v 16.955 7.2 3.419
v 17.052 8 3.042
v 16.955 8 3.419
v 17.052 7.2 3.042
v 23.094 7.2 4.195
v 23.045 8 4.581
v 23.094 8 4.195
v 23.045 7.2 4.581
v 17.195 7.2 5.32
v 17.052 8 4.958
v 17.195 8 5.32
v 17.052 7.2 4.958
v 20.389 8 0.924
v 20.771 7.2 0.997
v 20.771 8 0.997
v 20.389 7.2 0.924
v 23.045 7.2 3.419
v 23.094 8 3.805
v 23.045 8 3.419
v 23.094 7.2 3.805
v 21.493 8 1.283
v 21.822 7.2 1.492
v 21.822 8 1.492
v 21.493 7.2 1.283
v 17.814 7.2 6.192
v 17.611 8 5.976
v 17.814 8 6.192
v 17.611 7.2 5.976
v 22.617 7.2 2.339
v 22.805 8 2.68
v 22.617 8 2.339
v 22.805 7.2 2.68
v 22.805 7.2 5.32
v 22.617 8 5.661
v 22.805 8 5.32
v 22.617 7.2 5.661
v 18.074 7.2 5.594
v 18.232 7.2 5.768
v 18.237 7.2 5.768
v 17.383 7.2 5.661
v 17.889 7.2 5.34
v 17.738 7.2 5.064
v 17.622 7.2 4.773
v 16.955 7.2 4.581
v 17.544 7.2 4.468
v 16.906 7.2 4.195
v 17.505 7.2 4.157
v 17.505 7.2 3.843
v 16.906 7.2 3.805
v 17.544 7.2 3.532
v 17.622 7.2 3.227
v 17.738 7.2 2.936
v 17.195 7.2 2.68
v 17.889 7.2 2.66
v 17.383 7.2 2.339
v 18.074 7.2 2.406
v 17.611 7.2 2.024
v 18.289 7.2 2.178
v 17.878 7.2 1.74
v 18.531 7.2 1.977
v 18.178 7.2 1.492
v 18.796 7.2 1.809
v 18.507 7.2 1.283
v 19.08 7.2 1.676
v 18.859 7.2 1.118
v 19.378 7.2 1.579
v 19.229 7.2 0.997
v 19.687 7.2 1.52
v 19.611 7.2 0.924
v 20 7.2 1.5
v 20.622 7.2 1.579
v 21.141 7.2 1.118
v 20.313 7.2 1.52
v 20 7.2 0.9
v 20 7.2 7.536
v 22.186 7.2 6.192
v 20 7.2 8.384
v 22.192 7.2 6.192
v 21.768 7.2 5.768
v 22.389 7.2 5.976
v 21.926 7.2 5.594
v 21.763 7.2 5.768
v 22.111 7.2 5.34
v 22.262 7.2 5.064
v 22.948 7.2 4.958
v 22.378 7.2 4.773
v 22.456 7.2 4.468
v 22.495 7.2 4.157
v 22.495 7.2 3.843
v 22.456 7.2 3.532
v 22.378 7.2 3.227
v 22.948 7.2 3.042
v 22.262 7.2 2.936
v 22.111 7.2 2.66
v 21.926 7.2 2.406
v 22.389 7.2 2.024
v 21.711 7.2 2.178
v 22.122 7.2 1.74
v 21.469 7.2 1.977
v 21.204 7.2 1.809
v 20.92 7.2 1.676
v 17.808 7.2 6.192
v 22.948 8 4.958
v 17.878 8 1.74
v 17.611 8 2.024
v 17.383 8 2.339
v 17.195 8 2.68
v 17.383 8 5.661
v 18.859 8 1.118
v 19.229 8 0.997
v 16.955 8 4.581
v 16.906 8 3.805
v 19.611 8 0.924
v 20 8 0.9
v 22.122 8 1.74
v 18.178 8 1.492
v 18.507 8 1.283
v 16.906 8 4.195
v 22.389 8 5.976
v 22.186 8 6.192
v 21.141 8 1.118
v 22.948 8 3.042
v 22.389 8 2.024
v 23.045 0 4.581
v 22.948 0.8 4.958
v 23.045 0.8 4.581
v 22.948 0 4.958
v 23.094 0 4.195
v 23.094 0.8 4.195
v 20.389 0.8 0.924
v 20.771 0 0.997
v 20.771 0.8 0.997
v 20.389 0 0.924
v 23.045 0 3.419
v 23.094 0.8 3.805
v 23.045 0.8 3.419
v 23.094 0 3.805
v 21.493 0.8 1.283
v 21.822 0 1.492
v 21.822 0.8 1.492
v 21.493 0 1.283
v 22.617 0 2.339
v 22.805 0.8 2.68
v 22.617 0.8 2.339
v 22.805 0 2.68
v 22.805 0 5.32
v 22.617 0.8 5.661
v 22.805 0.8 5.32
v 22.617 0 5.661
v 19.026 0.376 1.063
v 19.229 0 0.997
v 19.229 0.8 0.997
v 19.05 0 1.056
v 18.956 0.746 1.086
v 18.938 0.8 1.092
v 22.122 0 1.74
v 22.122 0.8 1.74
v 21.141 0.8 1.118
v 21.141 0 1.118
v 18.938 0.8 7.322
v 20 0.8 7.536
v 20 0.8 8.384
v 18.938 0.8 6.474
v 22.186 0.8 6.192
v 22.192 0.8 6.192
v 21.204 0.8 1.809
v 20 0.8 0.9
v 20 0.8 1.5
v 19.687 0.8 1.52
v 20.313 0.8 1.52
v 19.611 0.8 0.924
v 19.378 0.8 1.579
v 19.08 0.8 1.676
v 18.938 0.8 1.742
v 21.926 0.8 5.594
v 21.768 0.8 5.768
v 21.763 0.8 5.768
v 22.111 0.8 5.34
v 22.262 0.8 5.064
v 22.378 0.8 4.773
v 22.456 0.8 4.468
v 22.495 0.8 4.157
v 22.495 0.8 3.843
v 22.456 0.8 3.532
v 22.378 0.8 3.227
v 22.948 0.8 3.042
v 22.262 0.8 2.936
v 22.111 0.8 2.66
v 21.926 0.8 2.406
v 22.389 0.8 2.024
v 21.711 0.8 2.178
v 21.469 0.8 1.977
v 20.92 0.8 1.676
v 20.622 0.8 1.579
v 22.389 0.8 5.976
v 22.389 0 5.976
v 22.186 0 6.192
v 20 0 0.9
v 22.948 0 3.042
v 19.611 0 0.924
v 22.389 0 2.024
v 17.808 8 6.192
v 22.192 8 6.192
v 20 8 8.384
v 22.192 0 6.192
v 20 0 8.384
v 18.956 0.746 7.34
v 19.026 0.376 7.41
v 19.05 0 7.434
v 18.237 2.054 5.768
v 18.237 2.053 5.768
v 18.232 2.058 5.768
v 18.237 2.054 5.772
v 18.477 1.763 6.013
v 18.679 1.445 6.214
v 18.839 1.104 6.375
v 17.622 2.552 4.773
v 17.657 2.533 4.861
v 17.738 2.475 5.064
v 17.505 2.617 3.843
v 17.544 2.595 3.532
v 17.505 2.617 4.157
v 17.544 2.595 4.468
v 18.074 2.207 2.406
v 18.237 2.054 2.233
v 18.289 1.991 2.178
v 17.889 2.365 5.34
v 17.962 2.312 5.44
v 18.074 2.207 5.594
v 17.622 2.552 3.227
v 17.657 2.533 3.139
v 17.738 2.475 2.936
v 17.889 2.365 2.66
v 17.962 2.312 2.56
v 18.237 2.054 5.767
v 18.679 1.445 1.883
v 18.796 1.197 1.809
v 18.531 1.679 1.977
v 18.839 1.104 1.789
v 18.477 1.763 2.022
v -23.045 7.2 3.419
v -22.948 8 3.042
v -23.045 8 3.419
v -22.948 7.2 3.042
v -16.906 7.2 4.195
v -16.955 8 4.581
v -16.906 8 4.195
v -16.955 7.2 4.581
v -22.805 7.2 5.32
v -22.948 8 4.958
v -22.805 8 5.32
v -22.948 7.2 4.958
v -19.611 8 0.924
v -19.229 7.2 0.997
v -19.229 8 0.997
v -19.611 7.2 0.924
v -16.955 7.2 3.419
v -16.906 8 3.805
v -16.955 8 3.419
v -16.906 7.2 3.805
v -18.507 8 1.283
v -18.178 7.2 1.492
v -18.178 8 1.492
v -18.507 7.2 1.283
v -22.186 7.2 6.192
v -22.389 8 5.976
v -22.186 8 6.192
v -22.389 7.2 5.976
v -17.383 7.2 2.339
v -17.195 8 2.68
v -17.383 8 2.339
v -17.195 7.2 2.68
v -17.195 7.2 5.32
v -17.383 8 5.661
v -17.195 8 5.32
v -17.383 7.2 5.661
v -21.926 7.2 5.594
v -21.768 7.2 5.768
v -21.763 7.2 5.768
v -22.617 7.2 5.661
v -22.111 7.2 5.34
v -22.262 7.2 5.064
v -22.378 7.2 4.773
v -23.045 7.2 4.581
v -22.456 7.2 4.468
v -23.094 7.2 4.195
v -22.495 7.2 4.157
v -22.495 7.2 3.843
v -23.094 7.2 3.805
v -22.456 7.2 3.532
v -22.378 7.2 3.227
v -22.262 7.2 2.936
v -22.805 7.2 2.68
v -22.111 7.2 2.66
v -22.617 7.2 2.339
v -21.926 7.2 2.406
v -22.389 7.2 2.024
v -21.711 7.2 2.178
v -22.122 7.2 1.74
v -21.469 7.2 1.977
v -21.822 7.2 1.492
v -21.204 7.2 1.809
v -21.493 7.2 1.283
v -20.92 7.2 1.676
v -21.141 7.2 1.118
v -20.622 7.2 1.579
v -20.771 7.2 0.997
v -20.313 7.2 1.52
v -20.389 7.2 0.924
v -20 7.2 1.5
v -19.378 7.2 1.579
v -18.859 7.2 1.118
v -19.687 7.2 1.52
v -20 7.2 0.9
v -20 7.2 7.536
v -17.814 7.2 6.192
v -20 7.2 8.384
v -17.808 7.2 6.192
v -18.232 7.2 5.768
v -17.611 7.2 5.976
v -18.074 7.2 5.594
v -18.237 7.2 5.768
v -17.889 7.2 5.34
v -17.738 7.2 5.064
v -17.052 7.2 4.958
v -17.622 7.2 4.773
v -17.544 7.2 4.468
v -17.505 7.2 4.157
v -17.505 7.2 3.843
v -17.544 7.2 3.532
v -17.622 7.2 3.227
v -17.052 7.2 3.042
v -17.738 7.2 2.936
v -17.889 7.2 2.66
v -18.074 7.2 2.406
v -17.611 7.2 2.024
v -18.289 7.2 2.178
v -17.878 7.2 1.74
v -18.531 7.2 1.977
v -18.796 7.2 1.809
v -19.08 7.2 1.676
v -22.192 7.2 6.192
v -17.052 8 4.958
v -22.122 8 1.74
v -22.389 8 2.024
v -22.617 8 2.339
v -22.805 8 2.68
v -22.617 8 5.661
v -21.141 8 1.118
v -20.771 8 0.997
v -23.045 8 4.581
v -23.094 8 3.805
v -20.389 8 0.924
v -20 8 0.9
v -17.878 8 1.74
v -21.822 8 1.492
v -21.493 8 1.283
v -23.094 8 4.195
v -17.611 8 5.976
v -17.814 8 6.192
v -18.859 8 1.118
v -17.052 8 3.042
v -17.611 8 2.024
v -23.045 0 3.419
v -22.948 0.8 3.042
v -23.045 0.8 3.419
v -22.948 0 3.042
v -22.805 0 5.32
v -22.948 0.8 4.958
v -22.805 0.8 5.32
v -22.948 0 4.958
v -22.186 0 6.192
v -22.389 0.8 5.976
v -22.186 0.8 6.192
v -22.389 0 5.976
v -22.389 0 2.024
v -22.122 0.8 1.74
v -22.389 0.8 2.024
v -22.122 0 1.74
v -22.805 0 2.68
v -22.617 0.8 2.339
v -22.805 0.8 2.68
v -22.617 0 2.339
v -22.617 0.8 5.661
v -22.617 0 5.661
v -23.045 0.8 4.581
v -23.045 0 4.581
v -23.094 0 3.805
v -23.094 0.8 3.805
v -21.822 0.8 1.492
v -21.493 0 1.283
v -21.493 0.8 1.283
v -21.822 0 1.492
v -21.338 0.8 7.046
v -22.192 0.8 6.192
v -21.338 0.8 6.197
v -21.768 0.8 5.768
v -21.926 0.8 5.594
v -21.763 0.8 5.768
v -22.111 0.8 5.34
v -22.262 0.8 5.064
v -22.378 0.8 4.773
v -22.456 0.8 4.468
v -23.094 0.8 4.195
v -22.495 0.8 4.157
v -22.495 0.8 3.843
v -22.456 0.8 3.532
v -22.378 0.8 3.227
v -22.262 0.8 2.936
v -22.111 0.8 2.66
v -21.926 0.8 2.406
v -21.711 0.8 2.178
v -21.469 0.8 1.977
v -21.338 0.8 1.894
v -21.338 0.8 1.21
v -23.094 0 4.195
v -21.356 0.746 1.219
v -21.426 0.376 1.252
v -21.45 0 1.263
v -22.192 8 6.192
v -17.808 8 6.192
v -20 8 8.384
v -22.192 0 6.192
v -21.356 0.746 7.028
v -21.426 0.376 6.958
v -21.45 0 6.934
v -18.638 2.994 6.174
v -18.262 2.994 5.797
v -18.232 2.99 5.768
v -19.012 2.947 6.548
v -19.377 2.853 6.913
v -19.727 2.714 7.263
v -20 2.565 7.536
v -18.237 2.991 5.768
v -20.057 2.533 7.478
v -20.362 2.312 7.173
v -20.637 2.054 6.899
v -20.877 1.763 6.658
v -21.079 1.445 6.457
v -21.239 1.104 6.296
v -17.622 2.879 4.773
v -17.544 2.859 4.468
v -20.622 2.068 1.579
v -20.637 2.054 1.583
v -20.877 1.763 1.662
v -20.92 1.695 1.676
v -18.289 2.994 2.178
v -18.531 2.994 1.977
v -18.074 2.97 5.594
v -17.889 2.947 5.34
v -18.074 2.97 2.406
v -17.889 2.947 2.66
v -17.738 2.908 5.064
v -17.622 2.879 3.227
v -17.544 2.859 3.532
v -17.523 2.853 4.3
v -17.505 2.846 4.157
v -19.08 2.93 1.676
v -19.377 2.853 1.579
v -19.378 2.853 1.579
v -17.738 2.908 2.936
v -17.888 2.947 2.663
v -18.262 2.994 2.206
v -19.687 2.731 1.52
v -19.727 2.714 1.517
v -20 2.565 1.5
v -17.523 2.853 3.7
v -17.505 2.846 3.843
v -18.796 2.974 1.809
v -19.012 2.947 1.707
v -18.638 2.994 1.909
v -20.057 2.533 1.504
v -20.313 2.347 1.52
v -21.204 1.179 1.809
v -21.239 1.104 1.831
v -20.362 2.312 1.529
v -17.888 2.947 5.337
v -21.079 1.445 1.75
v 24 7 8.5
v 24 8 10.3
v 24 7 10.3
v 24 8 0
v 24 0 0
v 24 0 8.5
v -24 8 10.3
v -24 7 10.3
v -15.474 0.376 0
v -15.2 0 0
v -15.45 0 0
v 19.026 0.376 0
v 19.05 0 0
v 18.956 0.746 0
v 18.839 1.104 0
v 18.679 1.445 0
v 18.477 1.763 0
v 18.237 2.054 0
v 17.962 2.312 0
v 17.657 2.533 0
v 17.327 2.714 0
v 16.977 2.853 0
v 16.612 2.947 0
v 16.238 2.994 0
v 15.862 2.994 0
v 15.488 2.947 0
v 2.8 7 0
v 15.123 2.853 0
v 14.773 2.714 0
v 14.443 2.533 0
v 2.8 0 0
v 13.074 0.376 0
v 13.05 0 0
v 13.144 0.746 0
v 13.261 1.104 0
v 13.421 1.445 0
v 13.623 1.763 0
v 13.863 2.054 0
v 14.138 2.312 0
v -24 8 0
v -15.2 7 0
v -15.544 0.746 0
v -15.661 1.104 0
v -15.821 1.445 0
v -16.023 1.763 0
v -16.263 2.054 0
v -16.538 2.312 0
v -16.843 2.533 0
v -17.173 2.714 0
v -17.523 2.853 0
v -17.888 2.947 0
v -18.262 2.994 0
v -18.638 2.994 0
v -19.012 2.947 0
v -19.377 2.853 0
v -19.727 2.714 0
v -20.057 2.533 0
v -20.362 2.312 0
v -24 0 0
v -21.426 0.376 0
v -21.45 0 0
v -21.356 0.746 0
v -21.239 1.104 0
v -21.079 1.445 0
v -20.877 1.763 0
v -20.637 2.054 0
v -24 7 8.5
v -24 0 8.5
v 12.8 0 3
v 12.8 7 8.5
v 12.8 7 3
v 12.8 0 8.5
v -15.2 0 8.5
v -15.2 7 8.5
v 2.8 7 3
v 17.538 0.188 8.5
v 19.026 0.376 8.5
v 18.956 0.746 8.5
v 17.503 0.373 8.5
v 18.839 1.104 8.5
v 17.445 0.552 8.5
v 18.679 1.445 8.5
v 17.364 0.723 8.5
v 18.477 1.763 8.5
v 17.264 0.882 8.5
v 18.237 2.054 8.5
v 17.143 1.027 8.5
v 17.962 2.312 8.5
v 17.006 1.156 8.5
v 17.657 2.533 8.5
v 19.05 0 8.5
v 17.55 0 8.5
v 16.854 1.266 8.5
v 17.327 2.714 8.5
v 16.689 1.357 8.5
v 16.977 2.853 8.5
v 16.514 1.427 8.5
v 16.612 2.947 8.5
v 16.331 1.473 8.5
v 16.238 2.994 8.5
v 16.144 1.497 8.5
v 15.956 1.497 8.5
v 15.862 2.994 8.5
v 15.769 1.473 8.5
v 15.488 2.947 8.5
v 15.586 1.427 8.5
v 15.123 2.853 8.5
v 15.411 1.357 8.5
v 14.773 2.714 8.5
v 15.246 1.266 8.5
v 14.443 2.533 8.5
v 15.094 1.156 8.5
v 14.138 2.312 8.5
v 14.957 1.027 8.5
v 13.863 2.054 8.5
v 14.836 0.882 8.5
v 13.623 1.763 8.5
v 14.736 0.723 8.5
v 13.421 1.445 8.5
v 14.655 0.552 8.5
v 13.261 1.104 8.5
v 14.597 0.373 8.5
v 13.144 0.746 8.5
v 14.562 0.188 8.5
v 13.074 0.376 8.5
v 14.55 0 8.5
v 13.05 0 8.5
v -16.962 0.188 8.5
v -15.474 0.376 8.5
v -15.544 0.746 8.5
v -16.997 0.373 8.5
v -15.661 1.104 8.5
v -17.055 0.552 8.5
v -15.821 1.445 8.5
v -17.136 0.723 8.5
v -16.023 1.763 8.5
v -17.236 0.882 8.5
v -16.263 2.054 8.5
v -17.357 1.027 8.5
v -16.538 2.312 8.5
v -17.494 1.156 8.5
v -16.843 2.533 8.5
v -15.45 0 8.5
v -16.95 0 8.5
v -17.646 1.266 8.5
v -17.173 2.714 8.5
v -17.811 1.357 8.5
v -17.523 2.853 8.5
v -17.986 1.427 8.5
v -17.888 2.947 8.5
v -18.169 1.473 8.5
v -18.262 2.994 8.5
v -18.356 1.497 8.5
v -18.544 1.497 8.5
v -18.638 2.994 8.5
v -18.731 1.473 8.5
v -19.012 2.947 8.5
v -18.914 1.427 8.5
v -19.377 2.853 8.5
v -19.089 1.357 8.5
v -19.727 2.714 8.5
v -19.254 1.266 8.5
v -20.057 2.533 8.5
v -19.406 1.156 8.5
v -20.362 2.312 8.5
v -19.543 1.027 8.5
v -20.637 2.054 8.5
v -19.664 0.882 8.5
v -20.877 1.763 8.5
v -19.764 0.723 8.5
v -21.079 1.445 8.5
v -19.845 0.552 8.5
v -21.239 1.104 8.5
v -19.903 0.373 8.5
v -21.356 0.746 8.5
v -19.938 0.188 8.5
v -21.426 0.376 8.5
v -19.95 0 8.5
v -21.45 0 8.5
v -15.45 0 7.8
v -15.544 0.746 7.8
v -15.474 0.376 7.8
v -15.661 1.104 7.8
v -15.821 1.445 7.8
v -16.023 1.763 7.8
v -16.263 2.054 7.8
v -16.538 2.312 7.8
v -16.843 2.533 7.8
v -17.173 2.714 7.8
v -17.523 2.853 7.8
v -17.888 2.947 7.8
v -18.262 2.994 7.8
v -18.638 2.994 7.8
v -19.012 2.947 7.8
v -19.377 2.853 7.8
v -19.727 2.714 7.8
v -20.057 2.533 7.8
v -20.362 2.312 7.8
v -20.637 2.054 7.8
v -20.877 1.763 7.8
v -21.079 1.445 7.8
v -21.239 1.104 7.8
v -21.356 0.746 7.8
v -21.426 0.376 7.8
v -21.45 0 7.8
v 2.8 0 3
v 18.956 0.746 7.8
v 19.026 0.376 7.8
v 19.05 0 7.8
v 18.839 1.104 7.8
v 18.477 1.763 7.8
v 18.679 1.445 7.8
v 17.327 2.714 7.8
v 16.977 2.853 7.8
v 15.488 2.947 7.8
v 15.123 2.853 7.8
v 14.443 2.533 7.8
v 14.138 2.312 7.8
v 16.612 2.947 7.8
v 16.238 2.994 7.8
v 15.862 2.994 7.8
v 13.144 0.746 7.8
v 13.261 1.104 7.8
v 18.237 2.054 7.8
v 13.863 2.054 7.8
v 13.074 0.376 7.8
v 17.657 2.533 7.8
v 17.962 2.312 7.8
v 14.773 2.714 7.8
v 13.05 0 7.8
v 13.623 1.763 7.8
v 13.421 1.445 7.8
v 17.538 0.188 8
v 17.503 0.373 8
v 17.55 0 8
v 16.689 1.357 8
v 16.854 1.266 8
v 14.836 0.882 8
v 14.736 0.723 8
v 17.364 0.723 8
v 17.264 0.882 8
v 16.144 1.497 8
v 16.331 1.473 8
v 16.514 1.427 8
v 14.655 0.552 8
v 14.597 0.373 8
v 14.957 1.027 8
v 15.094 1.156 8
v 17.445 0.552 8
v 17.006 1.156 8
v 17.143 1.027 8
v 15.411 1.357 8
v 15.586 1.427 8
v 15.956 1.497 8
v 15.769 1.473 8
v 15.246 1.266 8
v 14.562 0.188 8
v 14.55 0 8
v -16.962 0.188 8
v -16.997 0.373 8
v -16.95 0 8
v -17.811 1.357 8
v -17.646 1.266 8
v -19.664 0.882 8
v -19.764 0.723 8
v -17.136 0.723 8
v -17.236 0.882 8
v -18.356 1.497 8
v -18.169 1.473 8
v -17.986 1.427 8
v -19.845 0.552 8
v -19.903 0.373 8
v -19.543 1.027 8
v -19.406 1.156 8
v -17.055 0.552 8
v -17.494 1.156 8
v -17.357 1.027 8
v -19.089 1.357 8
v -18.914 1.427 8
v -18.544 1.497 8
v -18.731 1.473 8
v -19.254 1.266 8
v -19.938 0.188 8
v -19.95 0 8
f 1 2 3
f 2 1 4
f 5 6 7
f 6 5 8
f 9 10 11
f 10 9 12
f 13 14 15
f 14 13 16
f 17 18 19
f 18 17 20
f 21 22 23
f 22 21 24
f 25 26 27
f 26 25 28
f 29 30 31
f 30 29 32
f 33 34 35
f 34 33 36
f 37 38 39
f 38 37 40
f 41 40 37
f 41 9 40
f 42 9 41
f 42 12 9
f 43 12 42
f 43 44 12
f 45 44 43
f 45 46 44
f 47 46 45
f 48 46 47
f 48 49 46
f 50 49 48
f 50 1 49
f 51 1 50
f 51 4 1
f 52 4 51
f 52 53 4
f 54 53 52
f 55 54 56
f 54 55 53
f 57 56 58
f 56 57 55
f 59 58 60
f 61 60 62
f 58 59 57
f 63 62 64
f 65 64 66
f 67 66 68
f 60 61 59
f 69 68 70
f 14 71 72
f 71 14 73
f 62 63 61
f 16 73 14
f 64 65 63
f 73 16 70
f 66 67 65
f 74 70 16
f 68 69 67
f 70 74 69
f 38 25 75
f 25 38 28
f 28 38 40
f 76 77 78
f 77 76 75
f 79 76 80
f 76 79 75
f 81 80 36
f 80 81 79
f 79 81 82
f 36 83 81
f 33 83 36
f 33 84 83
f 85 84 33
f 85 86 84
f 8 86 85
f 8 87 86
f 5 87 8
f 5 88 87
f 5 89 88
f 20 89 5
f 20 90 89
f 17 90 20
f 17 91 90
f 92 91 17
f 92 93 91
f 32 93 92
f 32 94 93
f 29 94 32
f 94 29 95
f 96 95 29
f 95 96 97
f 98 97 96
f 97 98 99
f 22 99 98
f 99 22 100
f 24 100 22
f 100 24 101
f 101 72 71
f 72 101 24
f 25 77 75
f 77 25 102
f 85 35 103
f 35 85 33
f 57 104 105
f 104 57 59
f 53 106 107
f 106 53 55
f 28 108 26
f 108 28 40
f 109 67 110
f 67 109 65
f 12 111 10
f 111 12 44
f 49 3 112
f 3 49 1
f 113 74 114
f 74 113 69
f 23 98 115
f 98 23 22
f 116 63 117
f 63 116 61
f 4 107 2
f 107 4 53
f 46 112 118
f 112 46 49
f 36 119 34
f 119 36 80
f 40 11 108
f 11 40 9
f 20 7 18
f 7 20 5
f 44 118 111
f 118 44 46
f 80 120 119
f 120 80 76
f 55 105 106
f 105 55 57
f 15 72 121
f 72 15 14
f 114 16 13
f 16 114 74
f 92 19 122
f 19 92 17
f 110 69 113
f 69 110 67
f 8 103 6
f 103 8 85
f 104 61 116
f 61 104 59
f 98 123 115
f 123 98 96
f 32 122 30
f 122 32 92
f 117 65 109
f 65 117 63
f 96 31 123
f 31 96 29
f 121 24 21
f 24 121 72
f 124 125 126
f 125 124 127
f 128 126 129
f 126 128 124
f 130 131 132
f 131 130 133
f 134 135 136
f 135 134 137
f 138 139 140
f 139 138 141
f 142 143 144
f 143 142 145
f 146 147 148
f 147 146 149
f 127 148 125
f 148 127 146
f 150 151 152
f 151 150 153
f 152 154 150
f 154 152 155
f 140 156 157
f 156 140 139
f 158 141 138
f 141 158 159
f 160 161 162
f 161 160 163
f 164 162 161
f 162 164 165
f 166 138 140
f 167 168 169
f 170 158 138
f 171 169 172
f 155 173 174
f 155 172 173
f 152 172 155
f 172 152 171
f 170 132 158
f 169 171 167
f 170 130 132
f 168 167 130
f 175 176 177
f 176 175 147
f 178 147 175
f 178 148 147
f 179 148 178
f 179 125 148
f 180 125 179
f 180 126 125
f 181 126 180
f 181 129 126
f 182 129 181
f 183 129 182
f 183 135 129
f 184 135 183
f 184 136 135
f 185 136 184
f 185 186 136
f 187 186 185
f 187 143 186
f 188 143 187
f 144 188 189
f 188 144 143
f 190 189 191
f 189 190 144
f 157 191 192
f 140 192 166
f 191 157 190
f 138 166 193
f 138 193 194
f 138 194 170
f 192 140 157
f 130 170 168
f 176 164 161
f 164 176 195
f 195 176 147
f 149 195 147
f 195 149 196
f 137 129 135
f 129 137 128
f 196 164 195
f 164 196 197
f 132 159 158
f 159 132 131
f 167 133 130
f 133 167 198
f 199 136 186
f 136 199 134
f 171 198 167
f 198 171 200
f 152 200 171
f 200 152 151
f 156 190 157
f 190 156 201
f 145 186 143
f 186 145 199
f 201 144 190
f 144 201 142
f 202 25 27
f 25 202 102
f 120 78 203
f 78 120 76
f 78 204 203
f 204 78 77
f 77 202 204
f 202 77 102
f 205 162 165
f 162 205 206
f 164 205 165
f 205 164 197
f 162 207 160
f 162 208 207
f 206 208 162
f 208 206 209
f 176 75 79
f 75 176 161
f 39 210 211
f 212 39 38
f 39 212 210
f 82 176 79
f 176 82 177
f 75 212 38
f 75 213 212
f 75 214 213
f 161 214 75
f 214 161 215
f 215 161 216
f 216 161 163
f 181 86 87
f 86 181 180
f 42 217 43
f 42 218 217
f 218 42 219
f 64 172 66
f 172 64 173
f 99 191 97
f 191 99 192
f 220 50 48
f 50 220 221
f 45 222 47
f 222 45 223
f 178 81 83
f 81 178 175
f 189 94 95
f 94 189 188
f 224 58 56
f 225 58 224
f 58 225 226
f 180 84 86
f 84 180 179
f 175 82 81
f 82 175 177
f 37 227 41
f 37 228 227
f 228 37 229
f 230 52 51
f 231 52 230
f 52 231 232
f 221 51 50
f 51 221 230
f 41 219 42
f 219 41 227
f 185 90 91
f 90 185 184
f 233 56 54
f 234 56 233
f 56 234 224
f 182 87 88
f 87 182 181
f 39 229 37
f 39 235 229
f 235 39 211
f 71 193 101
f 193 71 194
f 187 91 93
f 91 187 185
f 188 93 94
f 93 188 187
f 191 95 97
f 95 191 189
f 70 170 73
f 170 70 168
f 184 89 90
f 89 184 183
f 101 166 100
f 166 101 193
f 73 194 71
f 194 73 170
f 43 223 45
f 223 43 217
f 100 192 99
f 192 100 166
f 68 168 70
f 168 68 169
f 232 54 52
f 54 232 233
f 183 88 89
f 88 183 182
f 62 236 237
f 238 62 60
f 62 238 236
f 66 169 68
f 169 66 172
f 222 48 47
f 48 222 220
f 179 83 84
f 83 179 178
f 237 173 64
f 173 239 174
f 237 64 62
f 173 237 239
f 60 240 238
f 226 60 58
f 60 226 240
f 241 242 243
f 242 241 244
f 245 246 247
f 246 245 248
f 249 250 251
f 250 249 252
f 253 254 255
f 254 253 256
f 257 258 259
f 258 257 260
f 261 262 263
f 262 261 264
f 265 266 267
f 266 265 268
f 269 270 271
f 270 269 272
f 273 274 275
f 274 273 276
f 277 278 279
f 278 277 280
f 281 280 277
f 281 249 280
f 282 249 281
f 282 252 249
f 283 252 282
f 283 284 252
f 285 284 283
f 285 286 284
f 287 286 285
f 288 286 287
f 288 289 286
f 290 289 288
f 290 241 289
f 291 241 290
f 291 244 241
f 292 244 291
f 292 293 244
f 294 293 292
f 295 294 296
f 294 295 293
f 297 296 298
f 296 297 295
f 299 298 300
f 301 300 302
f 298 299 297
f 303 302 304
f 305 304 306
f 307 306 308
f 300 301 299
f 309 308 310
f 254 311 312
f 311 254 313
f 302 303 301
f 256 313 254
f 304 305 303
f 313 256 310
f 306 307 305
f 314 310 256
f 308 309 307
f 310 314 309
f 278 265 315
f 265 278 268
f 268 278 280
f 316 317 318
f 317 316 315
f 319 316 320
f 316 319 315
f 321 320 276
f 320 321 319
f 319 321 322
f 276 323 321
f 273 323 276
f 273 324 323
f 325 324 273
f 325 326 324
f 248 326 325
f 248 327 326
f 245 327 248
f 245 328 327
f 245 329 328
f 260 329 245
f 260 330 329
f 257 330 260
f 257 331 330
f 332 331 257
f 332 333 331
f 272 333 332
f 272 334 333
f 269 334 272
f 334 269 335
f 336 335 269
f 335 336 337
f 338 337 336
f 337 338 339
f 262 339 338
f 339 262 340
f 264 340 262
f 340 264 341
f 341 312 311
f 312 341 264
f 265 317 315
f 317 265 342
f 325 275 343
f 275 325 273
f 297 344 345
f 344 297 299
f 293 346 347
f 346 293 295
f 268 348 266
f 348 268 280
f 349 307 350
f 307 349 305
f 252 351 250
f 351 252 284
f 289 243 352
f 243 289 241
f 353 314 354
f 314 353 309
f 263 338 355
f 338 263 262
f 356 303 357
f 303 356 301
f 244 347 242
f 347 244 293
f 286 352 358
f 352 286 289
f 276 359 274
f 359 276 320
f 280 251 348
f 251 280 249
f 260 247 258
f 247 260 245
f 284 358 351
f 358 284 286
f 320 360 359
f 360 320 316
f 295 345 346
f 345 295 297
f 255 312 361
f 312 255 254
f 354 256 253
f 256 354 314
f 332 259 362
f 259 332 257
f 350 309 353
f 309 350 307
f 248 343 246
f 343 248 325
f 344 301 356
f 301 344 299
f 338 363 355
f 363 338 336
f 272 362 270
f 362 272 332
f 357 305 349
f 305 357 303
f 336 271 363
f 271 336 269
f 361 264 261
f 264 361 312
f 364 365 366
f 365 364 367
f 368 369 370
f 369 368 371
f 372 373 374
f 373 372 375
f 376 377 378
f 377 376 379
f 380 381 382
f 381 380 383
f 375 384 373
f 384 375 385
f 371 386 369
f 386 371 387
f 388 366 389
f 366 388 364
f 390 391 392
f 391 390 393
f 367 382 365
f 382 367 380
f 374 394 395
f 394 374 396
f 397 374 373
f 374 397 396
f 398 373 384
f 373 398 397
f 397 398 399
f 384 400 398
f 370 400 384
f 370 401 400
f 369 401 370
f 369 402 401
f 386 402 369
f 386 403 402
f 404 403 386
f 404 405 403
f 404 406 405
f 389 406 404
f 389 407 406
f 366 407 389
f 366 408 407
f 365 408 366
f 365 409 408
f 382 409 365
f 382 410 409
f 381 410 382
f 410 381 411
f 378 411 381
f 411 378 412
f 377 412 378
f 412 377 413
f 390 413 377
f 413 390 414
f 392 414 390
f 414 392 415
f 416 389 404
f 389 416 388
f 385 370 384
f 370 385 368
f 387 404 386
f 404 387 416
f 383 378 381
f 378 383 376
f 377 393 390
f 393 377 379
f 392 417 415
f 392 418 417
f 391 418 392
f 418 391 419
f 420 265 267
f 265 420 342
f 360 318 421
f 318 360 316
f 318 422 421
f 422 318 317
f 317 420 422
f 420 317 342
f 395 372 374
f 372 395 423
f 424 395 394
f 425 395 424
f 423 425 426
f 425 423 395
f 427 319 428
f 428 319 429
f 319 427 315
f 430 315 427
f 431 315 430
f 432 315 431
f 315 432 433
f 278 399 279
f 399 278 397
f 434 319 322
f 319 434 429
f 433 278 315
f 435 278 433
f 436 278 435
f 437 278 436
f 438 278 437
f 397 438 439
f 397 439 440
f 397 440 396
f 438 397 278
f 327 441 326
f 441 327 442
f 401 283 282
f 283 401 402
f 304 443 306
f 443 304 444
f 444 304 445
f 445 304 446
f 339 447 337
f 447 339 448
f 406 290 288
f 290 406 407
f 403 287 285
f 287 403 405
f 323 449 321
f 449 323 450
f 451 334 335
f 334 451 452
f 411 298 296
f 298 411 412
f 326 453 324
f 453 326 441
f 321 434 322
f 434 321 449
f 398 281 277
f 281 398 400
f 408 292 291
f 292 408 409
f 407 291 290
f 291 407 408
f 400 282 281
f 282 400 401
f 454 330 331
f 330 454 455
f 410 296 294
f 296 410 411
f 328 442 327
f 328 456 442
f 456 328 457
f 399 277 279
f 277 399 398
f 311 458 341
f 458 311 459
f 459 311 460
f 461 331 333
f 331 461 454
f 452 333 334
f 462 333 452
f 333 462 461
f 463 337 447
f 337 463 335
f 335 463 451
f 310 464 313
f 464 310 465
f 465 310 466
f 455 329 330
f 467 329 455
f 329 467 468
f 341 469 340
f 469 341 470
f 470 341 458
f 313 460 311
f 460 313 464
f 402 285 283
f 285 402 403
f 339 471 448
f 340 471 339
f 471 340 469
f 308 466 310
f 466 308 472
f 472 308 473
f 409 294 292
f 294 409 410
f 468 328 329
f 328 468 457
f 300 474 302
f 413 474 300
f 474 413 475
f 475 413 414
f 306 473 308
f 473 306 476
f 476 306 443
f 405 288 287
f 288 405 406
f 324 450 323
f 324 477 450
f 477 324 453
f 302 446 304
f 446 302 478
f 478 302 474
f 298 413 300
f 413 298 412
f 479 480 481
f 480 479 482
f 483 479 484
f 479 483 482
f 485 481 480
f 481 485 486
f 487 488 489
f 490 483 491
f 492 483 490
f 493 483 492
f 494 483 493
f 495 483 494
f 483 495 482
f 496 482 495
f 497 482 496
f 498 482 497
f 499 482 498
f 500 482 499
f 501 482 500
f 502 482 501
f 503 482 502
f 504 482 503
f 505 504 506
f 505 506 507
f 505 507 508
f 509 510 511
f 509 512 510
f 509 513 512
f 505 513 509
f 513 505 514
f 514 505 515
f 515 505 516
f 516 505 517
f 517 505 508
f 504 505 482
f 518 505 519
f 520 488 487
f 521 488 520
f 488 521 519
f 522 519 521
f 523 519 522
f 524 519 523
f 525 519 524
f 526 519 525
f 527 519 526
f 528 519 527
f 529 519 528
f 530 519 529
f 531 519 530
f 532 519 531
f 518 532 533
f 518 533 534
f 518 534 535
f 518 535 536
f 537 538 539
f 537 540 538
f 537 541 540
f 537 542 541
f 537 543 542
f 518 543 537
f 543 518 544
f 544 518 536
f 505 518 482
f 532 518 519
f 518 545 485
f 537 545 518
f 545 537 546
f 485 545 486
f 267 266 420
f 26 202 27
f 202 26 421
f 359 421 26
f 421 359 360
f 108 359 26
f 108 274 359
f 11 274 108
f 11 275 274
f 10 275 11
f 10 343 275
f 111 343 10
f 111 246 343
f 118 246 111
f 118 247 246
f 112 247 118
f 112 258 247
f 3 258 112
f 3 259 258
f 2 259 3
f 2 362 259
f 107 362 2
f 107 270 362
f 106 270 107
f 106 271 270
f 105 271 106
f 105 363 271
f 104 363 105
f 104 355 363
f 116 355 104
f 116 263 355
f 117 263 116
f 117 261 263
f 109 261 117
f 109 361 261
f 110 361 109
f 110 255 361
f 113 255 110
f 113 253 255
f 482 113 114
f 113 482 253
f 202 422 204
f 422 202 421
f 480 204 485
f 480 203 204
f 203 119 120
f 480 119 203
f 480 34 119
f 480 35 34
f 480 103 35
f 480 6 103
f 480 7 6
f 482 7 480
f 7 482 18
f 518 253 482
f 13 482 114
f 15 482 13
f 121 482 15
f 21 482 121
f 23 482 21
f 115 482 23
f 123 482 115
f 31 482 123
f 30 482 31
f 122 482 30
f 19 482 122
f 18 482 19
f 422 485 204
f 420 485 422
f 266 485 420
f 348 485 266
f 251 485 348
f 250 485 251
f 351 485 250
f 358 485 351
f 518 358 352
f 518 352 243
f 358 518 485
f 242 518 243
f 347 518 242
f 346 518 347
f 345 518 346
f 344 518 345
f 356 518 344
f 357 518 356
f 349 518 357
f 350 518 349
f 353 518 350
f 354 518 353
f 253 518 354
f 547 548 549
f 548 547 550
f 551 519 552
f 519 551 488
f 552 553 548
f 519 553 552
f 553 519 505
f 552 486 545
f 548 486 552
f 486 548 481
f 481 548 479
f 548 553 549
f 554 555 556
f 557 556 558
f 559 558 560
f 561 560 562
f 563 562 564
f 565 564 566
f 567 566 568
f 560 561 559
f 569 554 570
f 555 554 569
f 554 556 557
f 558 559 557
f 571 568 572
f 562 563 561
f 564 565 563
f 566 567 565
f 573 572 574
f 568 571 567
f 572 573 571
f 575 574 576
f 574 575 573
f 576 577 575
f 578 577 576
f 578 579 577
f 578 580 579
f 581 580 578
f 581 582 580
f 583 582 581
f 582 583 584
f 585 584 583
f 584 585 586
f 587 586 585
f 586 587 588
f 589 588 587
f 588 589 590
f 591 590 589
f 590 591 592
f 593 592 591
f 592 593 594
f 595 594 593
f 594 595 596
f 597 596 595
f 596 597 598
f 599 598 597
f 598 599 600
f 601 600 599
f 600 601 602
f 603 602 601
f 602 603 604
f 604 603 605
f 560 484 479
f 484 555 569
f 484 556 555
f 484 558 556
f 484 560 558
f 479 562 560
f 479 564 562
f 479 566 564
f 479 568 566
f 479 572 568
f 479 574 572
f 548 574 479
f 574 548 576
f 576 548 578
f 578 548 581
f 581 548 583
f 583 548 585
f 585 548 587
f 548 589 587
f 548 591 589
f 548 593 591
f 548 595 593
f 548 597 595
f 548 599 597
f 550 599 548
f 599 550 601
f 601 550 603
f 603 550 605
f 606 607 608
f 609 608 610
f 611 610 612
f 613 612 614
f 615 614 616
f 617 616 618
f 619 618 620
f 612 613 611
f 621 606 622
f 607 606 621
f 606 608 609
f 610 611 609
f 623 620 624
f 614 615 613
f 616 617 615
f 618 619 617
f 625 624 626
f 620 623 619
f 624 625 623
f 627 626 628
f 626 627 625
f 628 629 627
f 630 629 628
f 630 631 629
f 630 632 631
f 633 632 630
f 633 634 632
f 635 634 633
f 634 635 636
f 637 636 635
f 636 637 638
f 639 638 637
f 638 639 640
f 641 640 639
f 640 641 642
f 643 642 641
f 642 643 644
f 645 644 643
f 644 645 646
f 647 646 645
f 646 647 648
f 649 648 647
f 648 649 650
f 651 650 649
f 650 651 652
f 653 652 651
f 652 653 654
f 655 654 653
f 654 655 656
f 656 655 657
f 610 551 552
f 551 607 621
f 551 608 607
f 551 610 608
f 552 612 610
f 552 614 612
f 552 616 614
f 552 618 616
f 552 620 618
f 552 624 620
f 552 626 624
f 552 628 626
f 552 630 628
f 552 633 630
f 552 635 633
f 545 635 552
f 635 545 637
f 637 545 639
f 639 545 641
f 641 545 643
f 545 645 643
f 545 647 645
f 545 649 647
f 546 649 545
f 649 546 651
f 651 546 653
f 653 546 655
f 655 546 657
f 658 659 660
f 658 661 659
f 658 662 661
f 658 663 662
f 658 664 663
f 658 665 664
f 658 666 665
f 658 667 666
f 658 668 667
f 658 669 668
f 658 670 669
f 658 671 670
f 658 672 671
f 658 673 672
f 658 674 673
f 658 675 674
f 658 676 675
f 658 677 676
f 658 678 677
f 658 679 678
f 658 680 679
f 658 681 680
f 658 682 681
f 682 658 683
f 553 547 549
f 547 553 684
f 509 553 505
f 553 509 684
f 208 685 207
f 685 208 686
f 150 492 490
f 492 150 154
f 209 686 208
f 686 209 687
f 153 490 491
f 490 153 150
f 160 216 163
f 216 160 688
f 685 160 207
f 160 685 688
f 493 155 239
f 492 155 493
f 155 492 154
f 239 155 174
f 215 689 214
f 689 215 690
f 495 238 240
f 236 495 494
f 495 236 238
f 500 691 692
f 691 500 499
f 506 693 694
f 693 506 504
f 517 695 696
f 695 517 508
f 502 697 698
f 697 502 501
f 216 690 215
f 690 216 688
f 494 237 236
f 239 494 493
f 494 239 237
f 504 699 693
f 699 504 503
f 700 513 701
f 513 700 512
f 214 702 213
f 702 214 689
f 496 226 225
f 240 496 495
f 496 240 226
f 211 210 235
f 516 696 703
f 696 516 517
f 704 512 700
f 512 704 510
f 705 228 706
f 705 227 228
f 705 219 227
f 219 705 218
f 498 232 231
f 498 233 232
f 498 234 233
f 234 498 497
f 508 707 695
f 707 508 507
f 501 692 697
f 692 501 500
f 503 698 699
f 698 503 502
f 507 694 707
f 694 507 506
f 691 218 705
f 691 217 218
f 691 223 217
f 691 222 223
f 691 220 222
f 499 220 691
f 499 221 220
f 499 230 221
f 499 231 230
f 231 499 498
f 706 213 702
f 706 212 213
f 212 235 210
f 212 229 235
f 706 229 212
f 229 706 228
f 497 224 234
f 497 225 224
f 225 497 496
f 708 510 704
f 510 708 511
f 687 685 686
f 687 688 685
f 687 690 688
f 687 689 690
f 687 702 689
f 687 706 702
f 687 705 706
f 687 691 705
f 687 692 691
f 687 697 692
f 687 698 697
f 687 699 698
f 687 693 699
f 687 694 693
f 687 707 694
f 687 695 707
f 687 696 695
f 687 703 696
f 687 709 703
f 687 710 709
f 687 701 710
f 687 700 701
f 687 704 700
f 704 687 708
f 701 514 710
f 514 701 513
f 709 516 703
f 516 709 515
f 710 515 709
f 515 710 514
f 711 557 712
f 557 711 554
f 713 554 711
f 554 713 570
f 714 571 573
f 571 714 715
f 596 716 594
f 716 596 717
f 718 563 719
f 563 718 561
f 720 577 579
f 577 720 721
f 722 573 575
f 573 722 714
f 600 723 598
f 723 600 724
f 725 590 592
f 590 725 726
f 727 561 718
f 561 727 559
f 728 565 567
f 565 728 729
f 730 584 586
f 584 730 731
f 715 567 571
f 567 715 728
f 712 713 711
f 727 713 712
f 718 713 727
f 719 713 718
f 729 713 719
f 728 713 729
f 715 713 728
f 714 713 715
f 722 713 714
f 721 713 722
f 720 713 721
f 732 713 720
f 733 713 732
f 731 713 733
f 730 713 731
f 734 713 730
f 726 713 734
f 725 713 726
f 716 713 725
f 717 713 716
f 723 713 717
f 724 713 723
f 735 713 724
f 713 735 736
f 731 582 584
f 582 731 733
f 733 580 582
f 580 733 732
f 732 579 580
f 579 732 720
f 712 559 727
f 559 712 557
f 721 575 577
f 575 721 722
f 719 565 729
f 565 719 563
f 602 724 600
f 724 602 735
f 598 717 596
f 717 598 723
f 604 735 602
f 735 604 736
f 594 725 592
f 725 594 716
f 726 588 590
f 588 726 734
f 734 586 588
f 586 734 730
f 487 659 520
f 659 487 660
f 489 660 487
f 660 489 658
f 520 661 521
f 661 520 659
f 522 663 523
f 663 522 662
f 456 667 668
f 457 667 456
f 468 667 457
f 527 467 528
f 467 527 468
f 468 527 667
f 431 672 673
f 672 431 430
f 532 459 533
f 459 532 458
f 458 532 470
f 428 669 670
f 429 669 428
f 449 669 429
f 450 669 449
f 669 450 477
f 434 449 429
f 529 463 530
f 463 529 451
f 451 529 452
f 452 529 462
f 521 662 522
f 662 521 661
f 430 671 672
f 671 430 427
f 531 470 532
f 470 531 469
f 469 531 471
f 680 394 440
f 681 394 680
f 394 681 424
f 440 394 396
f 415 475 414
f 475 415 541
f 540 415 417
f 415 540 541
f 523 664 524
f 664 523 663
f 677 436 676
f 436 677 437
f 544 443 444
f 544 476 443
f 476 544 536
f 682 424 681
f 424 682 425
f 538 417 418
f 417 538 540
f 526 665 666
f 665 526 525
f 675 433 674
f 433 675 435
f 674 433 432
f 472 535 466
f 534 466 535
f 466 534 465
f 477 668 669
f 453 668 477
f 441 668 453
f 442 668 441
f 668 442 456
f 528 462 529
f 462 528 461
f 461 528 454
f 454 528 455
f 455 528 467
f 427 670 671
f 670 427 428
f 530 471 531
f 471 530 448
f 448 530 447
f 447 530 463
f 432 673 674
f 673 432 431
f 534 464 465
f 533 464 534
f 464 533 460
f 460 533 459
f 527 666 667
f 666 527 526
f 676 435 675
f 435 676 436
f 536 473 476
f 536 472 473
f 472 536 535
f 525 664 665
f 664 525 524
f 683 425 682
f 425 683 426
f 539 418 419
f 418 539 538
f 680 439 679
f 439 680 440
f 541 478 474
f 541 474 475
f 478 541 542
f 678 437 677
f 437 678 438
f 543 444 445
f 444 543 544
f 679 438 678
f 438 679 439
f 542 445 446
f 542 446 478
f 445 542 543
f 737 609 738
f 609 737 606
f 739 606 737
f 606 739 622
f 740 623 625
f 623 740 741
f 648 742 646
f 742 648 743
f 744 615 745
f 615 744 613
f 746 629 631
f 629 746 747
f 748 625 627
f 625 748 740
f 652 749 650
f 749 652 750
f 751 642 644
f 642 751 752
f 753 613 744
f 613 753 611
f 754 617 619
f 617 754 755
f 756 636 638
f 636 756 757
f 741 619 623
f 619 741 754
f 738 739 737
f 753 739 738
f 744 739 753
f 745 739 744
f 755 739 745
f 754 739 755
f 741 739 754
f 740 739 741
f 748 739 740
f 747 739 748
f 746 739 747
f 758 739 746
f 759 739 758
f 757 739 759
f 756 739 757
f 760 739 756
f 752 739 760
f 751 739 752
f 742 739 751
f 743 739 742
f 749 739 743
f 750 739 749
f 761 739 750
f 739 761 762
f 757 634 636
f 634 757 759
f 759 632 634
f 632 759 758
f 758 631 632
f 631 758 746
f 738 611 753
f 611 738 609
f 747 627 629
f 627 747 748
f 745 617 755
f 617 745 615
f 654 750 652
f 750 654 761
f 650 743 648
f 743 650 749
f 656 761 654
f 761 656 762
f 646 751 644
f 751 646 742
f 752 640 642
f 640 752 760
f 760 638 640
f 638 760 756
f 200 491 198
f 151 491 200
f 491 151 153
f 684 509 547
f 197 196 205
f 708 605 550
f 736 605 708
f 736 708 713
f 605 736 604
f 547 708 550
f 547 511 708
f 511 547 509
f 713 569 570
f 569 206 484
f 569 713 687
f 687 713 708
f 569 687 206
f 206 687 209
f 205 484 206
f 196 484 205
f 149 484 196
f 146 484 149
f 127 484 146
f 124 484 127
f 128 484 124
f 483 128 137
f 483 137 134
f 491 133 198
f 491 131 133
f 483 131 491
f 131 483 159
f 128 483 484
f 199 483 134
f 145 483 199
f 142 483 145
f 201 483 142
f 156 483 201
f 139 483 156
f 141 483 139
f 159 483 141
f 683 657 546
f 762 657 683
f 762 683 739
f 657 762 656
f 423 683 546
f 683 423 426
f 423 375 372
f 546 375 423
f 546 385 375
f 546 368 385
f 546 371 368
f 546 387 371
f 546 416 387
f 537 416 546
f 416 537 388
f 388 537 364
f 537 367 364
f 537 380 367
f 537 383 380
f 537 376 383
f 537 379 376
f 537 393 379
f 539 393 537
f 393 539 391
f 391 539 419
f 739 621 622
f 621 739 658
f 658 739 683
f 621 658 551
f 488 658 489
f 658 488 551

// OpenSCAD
// file: lego_pin_hole.scad
lego = 8; //base lego unit (mm)
lego_pin = 4.8; // diameter of lego technic pin
lego_flange = 6; // diameter of lego pin flange
lego_flange_depth = 0.8; // depth of hole for lego pin flange
lego_clearance = 0.2; // clearance for moving joints, i.e. pin and hole
r1 = (lego_pin+lego_clearance)/2;
r2 = (lego_flange+lego_clearance)/2;
infinity=1000;

module lego_pin_hole(h, pos, rot=[0,0,0], extend=infinity, chamfer=0, teardrop=0)
{
	chamfer_internal_offset=0.2;
	chamfer_external_width=0.5;
	translate(pos)
	{
		rotate(rot)
		{
			rotate([0,-90,0])
			{
				union()
				{
					cylinder(h=h*lego+2*extend, r=r1, center=true);
					for(i = [-1,1])
					{
						translate([0, 0, ((h*lego+extend-lego_flange_depth)/2) * i])
						{
							cylinder(h=lego_flange_depth+extend, r=r2, center=true);
						}
					}
					if(chamfer)
					{
						translate([0, 0, -(h*lego)/2+lego_flange_depth-chamfer_internal_offset])
						{
							cylinder(h=(lego_flange+lego_clearance)/2, r1=(lego_flange+lego_clearance)/2, r2=0);
						}
						translate([0, 0, -(h*lego)/2-1])
						{
							intersection()
							{
								cylinder(h=(lego_flange+lego_clearance+chamfer_external_width)/2+1, r1=(lego_flange+lego_clearance+chamfer_external_width)/2+1, r2=0);
								// just to have good rendering
								//cylinder(h=3, r=(lego_flange+lego_clearance+chamfer_external_width)/2, center=true);
							}
						}
					}
					if(teardrop)
					{
						linear_extrude(h*lego+2*extend, center = true)
						{
							polygon([[r1/sqrt(2),r1/sqrt(2)], [r1/sqrt(2),-r1/sqrt(2)], [r1*sqrt(2),0]]);
						}
						for(i = [-1,1])
						{
							translate([0, 0, ((h*lego+extend-lego_flange_depth)/2) * i])
							{
								linear_extrude(lego_flange_depth+extend, center = true)
								{
									polygon([[r2/sqrt(2),r2/sqrt(2)], [r2/sqrt(2),-r2/sqrt(2)], [r2*sqrt(2),0]]);
								}
							}
						}
					}
				}
			}
		}
	}
}
 
// main file
infinity = 1000;

include <lego_pin_hole.scad>

base_LL = 6; // length of base in lego units (8mm)
base_WL = 2;
base_HL = 0;

side_wall_startL = 1;
side_wall_stopL = 2;

servo_L = 28; // length of servo in mm
servo_W = 14;
servo_H = 10.3; // height of servo cavity in mm
servo_H_front = 8.5; // height of front and back walls
ServoXOffset=-1.2; // offset of servo cavity

step_L = 10;
step_H = 3; 

screw_D = 6; // diameter of screw hole
screw_D2 = 3; // diameter of small screw hole
screw_H = 7.8; // height(depth) of screw hole
screw_space = 34.5; // space between screw holes

V_fillet = 4; // fillet of vertical edge in mm
brim = 0; // enable brim?

angles_lookup = [0, 90, 270, 180];

module servoMountHK15148Top()
{
	difference()
	{
		union()
		{
			difference() 
			{
				// body
				translate([0, 0, servo_H/2])
					cube([base_LL*lego, base_WL*lego, servo_H], center=true);
				// servo cavity
				translate([ServoXOffset,0,0])
					cube([servo_L, servo_W, infinity], center=true);
				// lower front and back walls
				translate([0, 0, infinity/2+servo_H_front])
					cube([infinity, servo_W, infinity], center = true);
				// pin holes
				for(i=[1,-1])
				{
					for(j=[1,-1])
					{
						lego_pin_hole(1, [(base_LL-1)*lego/2*j, lego*i/2, lego/2], [0,0,90], extend = 0.1, teardrop=1);
					}
				}
			}
			// step
			translate([(servo_L-step_L)/2+ServoXOffset, 0, step_H/2])
				cube([step_L, servo_W, step_H], center = true);
			// screw holes - additional fill for better print
			for (i=[1,-1])
				translate([(screw_space/2 )*i+ServoXOffset, 0, screw_H])
					cylinder(h=servo_H_front-screw_H, r=screw_D/2);
		}
		// screw holes
		for (i=[1,-1])
		{
			translate([(screw_space/2 )*i+ServoXOffset, 0, -infinity + screw_H])
				cylinder(h=infinity, r=screw_D/2);
			translate([(screw_space/2 )*i+ServoXOffset, 0, screw_H+.2])
				cylinder(h=infinity, r=screw_D2/2);
		}
	// cross section in Y axis - just for debug
	translate([0,-infinity/2,0])
		cube([infinity,infinity,infinity], center=true);
	// cross section in X axis - just for debug
	*translate([infinity/2,0,0])
		cube([infinity,infinity,infinity], center=true);
	}
}

$fn = 50;
servoMountHK15148Top();
